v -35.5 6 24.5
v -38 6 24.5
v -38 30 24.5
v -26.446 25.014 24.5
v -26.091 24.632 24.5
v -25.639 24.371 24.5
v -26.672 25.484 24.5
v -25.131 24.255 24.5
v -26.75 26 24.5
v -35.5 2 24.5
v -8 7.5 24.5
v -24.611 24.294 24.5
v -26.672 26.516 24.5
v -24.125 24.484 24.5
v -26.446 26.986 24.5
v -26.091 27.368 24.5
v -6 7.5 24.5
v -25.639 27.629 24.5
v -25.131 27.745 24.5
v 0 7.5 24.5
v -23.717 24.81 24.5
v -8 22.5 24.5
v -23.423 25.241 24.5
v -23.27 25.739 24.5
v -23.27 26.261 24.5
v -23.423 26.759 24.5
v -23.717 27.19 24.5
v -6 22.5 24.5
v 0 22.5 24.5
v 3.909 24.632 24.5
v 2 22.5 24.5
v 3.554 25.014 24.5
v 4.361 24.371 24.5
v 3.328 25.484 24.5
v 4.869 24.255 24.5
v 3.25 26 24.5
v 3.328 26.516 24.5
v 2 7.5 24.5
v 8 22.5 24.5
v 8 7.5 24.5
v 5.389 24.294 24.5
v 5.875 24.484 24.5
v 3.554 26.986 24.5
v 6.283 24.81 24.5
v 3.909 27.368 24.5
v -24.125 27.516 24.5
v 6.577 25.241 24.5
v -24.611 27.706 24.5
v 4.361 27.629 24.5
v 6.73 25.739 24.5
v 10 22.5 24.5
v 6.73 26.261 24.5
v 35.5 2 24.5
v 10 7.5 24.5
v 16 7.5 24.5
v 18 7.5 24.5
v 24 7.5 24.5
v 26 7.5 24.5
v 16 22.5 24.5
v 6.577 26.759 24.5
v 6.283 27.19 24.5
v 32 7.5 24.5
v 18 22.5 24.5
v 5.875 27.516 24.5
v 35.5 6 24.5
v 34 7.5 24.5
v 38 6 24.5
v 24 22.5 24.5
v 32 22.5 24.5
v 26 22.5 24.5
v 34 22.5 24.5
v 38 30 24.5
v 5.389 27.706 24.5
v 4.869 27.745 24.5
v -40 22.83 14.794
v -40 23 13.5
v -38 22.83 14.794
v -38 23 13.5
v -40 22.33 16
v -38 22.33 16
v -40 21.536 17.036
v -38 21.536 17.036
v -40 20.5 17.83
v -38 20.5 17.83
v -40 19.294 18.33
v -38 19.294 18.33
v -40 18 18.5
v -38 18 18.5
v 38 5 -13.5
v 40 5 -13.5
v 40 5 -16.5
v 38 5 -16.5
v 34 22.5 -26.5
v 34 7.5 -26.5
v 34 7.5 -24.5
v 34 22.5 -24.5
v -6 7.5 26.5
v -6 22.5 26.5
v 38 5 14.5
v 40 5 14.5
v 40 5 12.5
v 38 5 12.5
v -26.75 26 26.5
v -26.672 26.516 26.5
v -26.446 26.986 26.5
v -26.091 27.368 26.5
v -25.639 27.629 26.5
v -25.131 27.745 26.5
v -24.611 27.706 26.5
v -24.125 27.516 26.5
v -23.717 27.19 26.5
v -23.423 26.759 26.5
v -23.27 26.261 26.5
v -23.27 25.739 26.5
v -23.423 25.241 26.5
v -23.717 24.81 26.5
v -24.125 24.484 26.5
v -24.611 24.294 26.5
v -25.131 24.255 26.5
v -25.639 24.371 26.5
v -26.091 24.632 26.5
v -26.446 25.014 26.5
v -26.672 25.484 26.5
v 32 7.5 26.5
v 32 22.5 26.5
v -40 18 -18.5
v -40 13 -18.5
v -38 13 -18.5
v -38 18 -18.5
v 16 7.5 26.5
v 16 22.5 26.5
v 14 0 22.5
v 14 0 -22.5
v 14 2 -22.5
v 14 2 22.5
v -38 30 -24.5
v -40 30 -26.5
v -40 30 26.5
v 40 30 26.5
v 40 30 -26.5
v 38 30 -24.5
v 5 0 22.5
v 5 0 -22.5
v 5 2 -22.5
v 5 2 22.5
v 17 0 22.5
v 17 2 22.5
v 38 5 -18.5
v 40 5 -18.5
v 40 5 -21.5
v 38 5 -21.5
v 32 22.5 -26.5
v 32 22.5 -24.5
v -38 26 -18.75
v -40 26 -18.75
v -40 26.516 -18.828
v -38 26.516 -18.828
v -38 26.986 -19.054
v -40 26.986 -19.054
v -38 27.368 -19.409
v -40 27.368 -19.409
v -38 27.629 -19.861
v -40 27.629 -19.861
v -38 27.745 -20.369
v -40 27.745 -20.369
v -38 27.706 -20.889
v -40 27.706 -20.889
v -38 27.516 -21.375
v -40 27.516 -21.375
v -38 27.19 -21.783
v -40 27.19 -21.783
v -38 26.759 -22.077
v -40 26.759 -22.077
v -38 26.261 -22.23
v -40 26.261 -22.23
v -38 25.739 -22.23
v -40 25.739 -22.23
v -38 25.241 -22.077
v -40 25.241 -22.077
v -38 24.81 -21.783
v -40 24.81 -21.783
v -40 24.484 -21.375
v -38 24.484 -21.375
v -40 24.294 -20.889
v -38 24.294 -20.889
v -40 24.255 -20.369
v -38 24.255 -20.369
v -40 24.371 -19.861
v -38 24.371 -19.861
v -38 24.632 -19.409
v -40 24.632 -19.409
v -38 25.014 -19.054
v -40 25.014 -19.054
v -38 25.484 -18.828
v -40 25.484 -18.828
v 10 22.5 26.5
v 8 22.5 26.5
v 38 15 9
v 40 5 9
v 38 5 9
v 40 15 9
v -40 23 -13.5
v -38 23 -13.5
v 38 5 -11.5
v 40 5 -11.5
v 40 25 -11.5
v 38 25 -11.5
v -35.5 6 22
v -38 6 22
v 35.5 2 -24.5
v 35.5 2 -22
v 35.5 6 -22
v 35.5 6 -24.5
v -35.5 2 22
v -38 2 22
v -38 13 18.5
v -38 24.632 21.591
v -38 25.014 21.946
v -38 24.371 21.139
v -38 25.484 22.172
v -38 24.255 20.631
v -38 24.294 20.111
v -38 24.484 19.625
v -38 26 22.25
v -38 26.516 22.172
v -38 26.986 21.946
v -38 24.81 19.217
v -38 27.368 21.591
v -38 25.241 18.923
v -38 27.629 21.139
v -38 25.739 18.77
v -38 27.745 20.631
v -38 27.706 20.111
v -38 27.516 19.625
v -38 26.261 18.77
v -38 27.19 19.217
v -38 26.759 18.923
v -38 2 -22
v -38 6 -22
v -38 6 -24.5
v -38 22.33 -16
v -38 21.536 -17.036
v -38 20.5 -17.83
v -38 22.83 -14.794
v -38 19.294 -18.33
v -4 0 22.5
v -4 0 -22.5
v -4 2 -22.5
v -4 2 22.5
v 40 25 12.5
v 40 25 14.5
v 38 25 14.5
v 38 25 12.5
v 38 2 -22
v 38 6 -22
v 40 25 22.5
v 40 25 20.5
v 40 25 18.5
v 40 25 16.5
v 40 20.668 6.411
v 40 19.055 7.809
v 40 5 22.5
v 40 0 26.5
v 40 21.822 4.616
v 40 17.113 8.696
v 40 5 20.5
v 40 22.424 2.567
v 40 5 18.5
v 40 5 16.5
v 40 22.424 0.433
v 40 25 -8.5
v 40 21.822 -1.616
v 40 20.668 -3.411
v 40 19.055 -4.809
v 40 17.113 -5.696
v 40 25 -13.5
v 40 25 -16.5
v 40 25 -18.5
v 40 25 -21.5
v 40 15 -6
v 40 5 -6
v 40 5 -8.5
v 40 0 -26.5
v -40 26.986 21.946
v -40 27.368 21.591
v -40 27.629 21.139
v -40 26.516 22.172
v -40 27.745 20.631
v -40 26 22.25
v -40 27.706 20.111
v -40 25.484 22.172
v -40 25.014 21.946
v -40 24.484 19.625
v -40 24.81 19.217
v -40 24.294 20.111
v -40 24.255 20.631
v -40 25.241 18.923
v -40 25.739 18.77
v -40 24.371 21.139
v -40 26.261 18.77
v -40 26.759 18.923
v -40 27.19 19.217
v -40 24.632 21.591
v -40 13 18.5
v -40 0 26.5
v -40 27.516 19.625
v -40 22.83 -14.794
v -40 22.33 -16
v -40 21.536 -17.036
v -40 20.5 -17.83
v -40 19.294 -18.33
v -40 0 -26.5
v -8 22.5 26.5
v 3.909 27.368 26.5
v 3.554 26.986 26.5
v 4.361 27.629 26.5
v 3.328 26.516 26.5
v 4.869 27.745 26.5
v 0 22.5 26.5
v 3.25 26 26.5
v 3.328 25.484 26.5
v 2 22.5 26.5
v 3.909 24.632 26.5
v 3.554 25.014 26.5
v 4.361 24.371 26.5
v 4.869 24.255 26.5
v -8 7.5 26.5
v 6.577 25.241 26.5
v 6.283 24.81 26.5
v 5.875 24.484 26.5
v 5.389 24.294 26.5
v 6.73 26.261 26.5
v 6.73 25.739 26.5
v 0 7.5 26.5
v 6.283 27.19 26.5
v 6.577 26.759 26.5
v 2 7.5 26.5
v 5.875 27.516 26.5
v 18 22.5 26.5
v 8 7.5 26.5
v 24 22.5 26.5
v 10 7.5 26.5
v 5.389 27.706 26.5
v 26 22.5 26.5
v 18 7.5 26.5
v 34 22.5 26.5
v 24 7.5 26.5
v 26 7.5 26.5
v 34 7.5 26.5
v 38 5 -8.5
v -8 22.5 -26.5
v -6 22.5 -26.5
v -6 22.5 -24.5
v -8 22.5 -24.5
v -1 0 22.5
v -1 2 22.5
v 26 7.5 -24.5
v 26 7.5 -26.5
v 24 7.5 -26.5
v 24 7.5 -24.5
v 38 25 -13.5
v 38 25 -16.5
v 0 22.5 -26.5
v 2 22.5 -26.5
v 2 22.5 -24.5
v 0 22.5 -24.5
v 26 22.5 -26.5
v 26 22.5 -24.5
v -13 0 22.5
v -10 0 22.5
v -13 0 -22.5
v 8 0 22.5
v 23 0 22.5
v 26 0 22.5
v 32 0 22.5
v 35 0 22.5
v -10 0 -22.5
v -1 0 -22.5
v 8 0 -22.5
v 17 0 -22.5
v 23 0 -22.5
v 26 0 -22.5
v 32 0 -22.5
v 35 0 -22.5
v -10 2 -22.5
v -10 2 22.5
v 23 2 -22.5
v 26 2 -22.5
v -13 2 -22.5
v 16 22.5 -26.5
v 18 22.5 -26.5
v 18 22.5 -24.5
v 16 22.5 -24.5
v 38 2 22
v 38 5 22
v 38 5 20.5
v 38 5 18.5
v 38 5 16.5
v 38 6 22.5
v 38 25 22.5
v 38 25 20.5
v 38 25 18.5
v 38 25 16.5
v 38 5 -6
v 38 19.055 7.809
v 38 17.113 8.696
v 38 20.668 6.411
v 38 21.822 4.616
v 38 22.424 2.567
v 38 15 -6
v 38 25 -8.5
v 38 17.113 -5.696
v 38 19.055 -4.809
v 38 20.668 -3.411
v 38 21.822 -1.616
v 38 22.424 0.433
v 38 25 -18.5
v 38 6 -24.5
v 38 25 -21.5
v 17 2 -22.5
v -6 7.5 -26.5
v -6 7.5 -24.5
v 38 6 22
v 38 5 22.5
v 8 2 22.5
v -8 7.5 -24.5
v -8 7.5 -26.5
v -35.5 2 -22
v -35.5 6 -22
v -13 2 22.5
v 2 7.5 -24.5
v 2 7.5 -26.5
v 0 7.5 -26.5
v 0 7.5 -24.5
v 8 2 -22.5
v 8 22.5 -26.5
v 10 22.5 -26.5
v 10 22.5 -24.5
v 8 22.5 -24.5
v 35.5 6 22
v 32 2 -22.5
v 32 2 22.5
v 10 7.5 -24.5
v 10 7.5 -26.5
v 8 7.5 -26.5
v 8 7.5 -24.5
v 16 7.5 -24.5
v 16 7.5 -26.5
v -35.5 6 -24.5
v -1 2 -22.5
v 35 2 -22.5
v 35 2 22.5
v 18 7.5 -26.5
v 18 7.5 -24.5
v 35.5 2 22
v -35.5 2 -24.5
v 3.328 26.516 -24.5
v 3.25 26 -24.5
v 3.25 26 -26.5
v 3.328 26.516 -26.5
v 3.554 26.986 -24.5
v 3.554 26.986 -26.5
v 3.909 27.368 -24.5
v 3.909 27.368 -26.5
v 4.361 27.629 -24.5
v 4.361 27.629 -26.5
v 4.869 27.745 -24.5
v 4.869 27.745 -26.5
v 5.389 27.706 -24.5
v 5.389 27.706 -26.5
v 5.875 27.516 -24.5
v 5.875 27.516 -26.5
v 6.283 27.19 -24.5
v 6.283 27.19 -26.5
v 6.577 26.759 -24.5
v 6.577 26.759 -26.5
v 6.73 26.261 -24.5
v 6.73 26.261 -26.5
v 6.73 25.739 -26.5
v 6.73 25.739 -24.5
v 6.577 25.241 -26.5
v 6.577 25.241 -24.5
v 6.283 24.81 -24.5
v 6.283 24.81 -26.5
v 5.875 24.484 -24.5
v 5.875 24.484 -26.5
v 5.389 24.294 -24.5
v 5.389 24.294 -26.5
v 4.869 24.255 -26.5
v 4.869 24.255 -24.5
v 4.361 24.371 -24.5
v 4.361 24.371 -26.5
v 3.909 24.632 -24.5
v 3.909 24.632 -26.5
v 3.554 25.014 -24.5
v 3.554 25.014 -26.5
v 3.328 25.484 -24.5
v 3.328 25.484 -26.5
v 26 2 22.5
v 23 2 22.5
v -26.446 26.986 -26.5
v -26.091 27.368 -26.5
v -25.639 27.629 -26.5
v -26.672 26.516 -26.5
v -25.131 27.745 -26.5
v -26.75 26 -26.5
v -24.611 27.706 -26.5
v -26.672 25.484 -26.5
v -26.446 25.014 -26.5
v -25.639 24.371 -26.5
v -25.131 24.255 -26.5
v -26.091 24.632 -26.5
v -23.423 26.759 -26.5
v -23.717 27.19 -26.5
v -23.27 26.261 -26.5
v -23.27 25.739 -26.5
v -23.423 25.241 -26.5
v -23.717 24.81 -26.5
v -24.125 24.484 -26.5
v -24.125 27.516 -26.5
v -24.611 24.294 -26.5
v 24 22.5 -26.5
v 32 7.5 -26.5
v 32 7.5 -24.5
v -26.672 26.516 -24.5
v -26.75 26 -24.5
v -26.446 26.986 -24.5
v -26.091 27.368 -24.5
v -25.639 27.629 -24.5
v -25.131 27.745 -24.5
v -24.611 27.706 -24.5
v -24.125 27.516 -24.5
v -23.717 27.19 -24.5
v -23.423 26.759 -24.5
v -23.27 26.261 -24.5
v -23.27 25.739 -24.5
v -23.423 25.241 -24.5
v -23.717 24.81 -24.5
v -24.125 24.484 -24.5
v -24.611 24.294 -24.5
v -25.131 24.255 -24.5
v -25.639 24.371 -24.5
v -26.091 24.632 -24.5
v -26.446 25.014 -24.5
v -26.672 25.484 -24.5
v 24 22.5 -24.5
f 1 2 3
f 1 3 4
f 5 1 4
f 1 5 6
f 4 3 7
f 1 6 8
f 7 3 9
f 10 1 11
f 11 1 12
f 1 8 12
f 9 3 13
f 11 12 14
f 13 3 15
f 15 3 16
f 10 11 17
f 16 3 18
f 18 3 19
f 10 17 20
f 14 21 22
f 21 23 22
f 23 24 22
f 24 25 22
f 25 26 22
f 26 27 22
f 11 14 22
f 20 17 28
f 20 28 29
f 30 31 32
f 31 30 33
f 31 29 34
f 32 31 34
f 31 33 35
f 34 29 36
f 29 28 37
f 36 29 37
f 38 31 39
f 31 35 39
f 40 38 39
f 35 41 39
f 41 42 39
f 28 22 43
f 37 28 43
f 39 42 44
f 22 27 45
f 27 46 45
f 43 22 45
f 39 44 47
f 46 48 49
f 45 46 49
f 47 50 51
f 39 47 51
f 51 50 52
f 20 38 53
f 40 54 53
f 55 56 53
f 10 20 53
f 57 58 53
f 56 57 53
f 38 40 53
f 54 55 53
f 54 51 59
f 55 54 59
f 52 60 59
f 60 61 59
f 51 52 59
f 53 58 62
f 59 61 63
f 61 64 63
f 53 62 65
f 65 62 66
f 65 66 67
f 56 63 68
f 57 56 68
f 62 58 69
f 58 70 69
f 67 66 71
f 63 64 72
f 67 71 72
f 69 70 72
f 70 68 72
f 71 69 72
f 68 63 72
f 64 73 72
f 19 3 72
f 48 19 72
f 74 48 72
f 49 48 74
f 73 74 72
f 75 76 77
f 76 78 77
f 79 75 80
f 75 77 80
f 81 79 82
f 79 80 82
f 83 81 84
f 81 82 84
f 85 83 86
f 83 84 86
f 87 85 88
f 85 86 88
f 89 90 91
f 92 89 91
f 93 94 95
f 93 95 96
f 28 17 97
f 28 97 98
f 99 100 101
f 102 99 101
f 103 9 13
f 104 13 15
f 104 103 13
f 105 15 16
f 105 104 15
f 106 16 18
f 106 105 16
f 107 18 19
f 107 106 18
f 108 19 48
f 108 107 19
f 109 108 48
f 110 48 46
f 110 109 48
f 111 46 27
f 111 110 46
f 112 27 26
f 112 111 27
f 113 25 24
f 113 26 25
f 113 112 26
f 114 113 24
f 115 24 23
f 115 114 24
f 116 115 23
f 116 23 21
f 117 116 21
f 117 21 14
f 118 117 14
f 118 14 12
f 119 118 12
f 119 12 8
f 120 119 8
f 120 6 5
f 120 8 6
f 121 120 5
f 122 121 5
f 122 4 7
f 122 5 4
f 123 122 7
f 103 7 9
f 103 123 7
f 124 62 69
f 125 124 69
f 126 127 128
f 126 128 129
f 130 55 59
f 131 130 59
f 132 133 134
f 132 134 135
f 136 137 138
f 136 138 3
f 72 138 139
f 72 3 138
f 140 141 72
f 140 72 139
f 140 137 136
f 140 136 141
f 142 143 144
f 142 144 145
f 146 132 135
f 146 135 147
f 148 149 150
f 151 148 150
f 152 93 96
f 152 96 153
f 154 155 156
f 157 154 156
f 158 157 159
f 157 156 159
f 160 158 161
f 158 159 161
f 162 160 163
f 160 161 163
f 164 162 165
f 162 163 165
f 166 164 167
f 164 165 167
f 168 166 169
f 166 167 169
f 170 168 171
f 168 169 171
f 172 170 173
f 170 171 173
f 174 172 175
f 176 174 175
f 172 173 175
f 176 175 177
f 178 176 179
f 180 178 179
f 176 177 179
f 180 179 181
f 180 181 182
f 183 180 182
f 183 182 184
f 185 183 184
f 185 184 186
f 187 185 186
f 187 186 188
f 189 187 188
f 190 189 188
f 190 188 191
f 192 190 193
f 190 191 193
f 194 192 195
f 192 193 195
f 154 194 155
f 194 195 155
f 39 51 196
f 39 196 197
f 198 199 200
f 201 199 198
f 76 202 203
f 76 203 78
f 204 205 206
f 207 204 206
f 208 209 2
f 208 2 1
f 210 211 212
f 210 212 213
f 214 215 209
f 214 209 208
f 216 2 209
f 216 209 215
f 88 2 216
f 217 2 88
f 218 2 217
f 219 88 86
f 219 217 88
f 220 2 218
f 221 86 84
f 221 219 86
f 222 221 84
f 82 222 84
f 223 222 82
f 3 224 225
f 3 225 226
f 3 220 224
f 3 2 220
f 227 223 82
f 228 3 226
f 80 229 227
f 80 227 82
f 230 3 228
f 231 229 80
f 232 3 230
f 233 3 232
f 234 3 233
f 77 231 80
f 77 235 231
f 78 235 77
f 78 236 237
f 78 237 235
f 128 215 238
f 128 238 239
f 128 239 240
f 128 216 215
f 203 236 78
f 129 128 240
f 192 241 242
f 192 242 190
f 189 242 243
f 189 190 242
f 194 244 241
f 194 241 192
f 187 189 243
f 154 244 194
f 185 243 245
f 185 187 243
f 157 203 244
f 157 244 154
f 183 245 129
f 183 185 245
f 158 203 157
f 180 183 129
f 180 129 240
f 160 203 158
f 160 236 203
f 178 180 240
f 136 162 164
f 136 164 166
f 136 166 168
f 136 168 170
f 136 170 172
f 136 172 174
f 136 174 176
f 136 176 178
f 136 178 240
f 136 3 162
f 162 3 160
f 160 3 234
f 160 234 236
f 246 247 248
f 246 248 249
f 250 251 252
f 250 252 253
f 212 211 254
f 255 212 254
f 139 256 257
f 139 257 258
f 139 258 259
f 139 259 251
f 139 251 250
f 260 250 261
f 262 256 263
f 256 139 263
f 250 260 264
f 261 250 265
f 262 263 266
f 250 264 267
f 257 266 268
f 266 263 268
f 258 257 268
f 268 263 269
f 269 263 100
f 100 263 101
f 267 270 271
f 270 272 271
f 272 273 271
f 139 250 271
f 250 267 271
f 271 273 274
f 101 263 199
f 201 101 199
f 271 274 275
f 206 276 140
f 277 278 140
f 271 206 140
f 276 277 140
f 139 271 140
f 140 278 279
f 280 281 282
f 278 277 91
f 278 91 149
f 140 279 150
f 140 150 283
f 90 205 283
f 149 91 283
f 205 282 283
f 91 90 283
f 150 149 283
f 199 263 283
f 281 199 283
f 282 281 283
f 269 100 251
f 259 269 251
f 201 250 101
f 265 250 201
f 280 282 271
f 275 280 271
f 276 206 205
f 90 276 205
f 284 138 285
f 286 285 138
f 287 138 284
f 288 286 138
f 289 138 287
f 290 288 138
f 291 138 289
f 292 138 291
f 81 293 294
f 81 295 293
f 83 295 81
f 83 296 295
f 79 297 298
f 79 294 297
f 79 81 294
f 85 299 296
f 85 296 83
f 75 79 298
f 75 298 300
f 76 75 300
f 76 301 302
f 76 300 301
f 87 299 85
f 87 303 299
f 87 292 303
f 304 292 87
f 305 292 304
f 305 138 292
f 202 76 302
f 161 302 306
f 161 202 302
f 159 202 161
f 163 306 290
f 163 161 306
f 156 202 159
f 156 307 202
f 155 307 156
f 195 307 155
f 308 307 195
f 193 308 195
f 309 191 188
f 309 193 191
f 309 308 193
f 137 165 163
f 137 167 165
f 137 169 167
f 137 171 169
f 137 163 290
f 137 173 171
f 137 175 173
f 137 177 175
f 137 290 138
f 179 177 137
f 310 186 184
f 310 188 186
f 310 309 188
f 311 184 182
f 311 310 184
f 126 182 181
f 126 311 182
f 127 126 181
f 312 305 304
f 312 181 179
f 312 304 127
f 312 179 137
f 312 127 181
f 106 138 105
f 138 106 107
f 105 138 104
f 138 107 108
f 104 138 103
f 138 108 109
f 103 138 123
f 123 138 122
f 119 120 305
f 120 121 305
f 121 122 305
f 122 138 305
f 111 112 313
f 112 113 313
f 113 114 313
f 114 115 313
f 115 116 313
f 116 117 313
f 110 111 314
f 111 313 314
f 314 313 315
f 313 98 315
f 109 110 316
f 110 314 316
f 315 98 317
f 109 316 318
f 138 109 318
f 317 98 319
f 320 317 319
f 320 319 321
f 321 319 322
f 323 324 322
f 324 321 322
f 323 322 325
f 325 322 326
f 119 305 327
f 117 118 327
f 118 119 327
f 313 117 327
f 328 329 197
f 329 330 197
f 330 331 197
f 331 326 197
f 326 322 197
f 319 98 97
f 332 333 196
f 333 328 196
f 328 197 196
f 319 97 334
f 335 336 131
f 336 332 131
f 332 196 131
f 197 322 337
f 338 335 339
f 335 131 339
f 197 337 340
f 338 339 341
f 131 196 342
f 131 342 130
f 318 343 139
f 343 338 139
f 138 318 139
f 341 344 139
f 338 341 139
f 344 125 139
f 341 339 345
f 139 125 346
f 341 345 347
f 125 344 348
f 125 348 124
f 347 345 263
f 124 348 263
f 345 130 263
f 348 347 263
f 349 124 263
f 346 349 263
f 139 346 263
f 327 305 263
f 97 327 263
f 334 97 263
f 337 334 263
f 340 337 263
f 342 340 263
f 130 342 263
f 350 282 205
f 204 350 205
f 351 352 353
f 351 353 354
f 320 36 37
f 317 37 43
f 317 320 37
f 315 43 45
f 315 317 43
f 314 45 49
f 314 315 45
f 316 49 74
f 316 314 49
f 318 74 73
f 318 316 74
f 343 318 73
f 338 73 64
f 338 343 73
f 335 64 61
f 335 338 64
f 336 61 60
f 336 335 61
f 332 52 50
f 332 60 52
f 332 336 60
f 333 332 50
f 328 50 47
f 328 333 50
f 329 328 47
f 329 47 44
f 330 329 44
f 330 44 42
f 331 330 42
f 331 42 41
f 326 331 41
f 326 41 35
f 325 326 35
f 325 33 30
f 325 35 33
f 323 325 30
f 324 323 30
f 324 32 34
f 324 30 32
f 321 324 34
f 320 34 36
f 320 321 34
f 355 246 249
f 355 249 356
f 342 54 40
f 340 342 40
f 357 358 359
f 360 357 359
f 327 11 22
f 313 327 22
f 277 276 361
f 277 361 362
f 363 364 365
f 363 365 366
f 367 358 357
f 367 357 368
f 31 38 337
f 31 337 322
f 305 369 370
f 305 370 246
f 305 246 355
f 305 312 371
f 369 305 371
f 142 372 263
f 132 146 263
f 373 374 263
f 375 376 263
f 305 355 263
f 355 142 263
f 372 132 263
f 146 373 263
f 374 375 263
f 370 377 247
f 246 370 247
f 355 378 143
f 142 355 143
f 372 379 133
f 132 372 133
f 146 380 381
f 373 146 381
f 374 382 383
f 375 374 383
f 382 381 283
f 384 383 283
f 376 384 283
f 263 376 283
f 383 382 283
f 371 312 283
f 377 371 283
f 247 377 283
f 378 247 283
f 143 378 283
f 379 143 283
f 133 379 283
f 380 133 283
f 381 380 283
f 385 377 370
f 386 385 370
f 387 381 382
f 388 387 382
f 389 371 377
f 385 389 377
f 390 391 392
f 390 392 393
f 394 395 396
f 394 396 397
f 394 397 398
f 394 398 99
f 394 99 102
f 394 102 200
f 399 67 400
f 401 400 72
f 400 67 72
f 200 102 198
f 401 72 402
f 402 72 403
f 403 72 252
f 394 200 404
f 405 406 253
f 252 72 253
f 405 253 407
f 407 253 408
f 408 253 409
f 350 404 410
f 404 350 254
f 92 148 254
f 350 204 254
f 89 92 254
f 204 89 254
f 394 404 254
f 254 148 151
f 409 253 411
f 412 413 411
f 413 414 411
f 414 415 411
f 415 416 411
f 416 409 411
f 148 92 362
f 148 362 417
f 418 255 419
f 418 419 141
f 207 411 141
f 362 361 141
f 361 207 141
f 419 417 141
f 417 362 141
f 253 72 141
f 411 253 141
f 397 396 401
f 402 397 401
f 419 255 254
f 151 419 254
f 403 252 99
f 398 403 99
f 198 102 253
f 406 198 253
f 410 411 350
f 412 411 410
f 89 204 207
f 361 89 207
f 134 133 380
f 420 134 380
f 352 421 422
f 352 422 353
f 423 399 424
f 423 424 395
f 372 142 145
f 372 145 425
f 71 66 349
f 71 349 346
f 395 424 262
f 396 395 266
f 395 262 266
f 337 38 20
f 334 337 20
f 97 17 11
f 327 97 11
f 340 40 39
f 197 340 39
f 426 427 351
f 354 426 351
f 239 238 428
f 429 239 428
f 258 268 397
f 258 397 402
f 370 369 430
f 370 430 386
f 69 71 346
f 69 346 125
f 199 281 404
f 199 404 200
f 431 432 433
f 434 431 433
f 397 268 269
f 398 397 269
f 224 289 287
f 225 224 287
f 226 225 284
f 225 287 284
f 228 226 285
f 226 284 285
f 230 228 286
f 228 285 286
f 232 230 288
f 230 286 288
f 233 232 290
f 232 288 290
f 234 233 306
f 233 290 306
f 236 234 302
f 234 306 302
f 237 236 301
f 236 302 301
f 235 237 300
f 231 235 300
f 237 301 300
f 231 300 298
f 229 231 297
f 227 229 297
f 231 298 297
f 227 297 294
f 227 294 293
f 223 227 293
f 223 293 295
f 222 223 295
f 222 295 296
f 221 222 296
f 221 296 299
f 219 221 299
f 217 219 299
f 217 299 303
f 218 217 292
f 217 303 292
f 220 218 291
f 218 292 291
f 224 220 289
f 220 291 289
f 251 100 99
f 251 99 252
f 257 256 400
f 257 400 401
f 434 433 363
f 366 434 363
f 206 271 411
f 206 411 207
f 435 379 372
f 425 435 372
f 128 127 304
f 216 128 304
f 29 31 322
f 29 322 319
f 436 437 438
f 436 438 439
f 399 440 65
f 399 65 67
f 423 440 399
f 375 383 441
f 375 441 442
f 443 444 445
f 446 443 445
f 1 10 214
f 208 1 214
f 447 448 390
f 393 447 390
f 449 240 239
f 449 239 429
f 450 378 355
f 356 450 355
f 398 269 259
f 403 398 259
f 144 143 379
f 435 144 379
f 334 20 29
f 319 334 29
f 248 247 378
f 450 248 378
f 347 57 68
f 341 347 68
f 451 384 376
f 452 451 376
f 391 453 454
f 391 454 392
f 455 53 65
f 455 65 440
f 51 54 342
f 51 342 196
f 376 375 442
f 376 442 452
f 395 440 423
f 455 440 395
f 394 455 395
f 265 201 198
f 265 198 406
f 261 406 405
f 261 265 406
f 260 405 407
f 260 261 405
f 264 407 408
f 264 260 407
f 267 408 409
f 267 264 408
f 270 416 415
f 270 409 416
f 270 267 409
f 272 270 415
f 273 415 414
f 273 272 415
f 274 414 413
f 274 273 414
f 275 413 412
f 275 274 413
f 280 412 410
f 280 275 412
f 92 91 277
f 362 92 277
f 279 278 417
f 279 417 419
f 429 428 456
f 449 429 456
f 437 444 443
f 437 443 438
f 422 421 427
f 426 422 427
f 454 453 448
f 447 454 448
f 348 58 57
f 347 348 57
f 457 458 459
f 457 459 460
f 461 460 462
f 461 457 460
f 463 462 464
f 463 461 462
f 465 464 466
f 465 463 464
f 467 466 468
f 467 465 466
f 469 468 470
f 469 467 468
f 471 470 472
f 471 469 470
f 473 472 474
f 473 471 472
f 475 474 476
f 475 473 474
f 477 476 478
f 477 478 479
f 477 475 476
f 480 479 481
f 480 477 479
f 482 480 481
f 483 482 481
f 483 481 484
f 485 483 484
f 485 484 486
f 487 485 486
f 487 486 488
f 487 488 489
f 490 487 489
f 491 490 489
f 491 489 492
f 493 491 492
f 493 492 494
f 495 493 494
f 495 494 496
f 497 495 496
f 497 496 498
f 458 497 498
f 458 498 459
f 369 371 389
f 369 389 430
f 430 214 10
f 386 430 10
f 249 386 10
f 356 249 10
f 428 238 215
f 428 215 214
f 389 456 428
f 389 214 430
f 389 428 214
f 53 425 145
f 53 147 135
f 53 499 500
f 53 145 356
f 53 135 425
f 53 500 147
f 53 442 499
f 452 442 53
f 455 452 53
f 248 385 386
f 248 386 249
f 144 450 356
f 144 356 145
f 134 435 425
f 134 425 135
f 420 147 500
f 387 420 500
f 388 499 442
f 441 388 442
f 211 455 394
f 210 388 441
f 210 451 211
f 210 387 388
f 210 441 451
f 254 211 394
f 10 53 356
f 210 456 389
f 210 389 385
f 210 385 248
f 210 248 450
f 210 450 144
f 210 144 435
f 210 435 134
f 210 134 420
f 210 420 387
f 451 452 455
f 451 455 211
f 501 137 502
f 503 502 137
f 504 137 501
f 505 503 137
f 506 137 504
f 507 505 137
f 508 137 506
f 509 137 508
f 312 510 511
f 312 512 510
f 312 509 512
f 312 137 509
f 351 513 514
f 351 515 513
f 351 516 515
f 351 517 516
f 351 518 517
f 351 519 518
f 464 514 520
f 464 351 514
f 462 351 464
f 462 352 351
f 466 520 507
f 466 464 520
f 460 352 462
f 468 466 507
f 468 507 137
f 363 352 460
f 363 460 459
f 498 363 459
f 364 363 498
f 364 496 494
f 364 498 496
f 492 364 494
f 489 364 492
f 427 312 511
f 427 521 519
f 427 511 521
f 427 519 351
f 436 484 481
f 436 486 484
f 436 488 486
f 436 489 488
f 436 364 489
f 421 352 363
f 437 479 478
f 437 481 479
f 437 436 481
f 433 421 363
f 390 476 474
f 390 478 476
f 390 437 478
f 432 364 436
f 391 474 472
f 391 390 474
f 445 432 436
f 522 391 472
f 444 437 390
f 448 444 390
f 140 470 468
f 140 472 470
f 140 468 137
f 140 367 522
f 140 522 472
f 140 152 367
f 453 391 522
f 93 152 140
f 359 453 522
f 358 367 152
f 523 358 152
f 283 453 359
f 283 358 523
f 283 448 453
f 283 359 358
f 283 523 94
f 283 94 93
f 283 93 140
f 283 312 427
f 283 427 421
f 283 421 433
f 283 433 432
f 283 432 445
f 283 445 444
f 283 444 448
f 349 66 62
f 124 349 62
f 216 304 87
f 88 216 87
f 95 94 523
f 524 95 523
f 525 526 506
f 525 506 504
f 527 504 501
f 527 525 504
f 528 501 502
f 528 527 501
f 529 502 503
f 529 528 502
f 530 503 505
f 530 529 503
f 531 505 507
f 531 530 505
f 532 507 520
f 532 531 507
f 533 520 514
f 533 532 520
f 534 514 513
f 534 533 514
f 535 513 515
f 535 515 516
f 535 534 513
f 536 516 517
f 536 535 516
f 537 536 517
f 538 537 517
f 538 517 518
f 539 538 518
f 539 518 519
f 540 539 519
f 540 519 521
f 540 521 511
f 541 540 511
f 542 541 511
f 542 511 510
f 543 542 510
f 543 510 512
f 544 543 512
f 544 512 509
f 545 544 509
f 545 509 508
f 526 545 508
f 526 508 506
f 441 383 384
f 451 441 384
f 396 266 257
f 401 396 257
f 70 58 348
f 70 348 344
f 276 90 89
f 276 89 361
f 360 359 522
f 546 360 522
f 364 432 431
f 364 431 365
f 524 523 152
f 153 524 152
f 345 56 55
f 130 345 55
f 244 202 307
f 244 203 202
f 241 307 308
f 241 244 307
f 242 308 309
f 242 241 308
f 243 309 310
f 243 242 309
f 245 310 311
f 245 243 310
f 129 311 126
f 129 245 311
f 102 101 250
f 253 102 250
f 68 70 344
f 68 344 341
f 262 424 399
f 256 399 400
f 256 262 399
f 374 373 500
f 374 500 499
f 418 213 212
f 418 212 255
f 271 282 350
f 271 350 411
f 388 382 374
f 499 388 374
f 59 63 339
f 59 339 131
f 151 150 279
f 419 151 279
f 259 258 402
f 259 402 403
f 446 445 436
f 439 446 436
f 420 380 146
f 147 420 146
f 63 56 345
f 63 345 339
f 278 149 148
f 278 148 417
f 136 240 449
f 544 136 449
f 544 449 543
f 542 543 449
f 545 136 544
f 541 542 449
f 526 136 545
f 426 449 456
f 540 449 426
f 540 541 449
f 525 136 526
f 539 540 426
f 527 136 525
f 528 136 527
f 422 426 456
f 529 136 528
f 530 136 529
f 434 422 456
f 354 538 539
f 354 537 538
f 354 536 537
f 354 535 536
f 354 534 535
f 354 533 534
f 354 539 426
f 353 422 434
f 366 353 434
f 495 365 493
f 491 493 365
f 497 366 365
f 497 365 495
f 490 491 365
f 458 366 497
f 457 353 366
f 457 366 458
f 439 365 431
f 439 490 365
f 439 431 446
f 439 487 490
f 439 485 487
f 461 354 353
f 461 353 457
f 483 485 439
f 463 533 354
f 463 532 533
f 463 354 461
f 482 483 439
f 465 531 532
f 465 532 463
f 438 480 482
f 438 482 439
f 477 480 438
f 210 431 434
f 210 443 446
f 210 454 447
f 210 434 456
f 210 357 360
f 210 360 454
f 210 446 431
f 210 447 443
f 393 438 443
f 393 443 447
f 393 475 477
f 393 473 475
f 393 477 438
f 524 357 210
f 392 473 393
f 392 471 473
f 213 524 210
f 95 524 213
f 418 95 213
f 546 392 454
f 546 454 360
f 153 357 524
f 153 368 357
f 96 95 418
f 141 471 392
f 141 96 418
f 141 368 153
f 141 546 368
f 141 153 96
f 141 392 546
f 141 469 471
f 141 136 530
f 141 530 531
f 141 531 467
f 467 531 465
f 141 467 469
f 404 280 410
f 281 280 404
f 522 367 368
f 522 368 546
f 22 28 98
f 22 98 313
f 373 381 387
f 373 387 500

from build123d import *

# Parameters (mm, degrees)
SKETCH1_W           = 80
SKETCH1_H           = 53
BOSS_EXTRUDE1_DEPTH = 30
SKETCH2_W           = 76
SKETCH2_H           = 49
CUT_EXTRUDE1_DEPTH  = 28
CUT_EXTRUDE2_DEPTH  = 6
SKETCH4_W           = 37
SKETCH4_H           = 10
CUT_EXTRUDE3_DEPTH  = 6
SKETCH5_W           = 2.5
SKETCH5_H           = 2.5
STANDOFFS_DEPTH     = 4
FILLET3_R           = 5
FILLET4_R           = 5
SKETCH6_W           = 3
SKETCH6_H           = 45
BOTTOM_GRILL_DEPTH  = 2
CUT_EXTRUDE5_REACH  = 74.863
SKETCH7_W           = 2
SKETCH7_H           = 15
CUT_EXTRUDE6_START  = -53
SKETCH8_R           = 1.75
CUT_EXTRUDE6_DEPTH  = 53
SKETCH9_R           = 1.75
CUT_EXTRUDE7_DEPTH  = 2
SKETCH10_W          = 3
SKETCH10_H          = 20
SKETCH10_W_2        = 2
CUT_EXTRUDE8_DEPTH  = 2


with BuildPart() as part:
    # Sketch1 → Boss-Extrude1 (new body)
    with BuildSketch(Plane(origin=(0, 0, 0), x_dir=(1, 0, 0), z_dir=(0, 1, 0))):
        Rectangle(SKETCH1_W, SKETCH1_H)
    extrude(amount=BOSS_EXTRUDE1_DEPTH)

    # Sketch2 → Cut-Extrude1 (cut)
    with BuildSketch(Plane(origin=(0, 30, 0), x_dir=(1, 0, 0), z_dir=(0, 1, 0))):
        Rectangle(SKETCH2_W, SKETCH2_H)
    extrude(amount=-CUT_EXTRUDE1_DEPTH, mode=Mode.SUBTRACT)

    # Sketch3 → Cut-Extrude2 (cut)
    with BuildSketch(Plane(origin=(40, 0, 0), x_dir=(0, 0, -1), z_dir=(1, 0, 0))):
        with BuildLine():
            Line((6, 15), (6, 5))
            Line((6, 5), (-9, 5))
            Line((-9, 5), (-9, 15))
            ThreePointArc((-9, 15), (-1.5, 22.5), (6, 15))
        make_face()
    extrude(amount=-CUT_EXTRUDE2_DEPTH, mode=Mode.SUBTRACT)

    # Sketch4 → Cut-Extrude3 (cut)
    with BuildSketch(Plane.ZY.offset(40)):
        with Locations((0, 18)):
            Rectangle(SKETCH4_W, SKETCH4_H)
    extrude(amount=-CUT_EXTRUDE3_DEPTH, mode=Mode.SUBTRACT)

    # Sketch5 → Standoffs (add)
    with BuildSketch(Plane(origin=(0, 2, 0), x_dir=(1, 0, 0), z_dir=(0, 1, 0))):
        with Locations((36.75, 23.25)):
            Rectangle(SKETCH5_W, SKETCH5_H)
        with Locations((36.75, -23.25)):
            Rectangle(SKETCH5_W, SKETCH5_H)
        with Locations((-36.75, -23.25)):
            Rectangle(SKETCH5_W, SKETCH5_H)
        with Locations((-36.75, 23.25)):
            Rectangle(SKETCH5_W, SKETCH5_H)
    extrude(amount=STANDOFFS_DEPTH)

    # Fillet3
    fillet3_edges = [part.edges().sort_by_distance(p)[0] for p in [
        (-39, 23, -18.5),
    ]]
    fillet(fillet3_edges, radius=FILLET3_R)

    # Fillet4
    fillet4_edges = [part.edges().sort_by_distance(p)[0] for p in [
        (-39, 23, 18.5),
    ]]
    fillet(fillet4_edges, radius=FILLET4_R)

    # Sketch6 → Bottom Grill (cut)
    with BuildSketch(Plane.XZ):
        with Locations((33.5, 0)):
            Rectangle(SKETCH6_W, SKETCH6_H)
        with Locations((24.5, 0)):
            Rectangle(SKETCH6_W, SKETCH6_H)
        with Locations((15.5, 0)):
            Rectangle(SKETCH6_W, SKETCH6_H)
        with Locations((6.5, 0)):
            Rectangle(SKETCH6_W, SKETCH6_H)
        with Locations((-2.5, 0)):
            Rectangle(SKETCH6_W, SKETCH6_H)
        with Locations((-11.5, 0)):
            Rectangle(SKETCH6_W, SKETCH6_H)
    extrude(amount=-BOTTOM_GRILL_DEPTH, mode=Mode.SUBTRACT)

    # Cut-Extrude5: up to this face of the body (flat: up to its plane)
    cut_extrude5_end = Plane(part.part.faces().sort_by_distance((0, 15, 26.5))[0])
    # Sketch7 → Cut-Extrude5 (cut, up to the picked face)
    with BuildSketch(Plane(origin=(0, 0, -26.5), x_dir=(-1, 0, 0), z_dir=(0, 0, -1)), mode=Mode.PRIVATE) as cut_extrude5_sk1:
        with Locations((-33, 15)):
            Rectangle(SKETCH7_W, SKETCH7_H)
    cut_extrude5_tool1 = split(extrude(cut_extrude5_sk1.sketch, amount=-CUT_EXTRUDE5_REACH, mode=Mode.PRIVATE), bisect_by=cut_extrude5_end, keep=Keep.BOTH, mode=Mode.PRIVATE)
    # Sketch7 → Cut-Extrude5 (cut, up to the picked face)
    with BuildSketch(Plane(origin=(0, 0, -26.5), x_dir=(-1, 0, 0), z_dir=(0, 0, -1)), mode=Mode.PRIVATE) as cut_extrude5_sk2:
        with Locations((-25, 15)):
            Rectangle(SKETCH7_W, SKETCH7_H)
    cut_extrude5_tool2 = split(extrude(cut_extrude5_sk2.sketch, amount=-CUT_EXTRUDE5_REACH, mode=Mode.PRIVATE), bisect_by=cut_extrude5_end, keep=Keep.BOTH, mode=Mode.PRIVATE)
    # Sketch7 → Cut-Extrude5 (cut, up to the picked face)
    with BuildSketch(Plane(origin=(0, 0, -26.5), x_dir=(-1, 0, 0), z_dir=(0, 0, -1)), mode=Mode.PRIVATE) as cut_extrude5_sk3:
        with Locations((-17, 15)):
            Rectangle(SKETCH7_W, SKETCH7_H)
    cut_extrude5_tool3 = split(extrude(cut_extrude5_sk3.sketch, amount=-CUT_EXTRUDE5_REACH, mode=Mode.PRIVATE), bisect_by=cut_extrude5_end, keep=Keep.BOTH, mode=Mode.PRIVATE)
    # Sketch7 → Cut-Extrude5 (cut, up to the picked face)
    with BuildSketch(Plane(origin=(0, 0, -26.5), x_dir=(-1, 0, 0), z_dir=(0, 0, -1)), mode=Mode.PRIVATE) as cut_extrude5_sk4:
        with Locations((-9, 15)):
            Rectangle(SKETCH7_W, SKETCH7_H)
    cut_extrude5_tool4 = split(extrude(cut_extrude5_sk4.sketch, amount=-CUT_EXTRUDE5_REACH, mode=Mode.PRIVATE), bisect_by=cut_extrude5_end, keep=Keep.BOTH, mode=Mode.PRIVATE)
    # Sketch7 → Cut-Extrude5 (cut, up to the picked face)
    with BuildSketch(Plane(origin=(0, 0, -26.5), x_dir=(-1, 0, 0), z_dir=(0, 0, -1)), mode=Mode.PRIVATE) as cut_extrude5_sk5:
        with Locations((-1, 15)):
            Rectangle(SKETCH7_W, SKETCH7_H)
    cut_extrude5_tool5 = split(extrude(cut_extrude5_sk5.sketch, amount=-CUT_EXTRUDE5_REACH, mode=Mode.PRIVATE), bisect_by=cut_extrude5_end, keep=Keep.BOTH, mode=Mode.PRIVATE)
    # Sketch7 → Cut-Extrude5 (cut, up to the picked face)
    with BuildSketch(Plane(origin=(0, 0, -26.5), x_dir=(-1, 0, 0), z_dir=(0, 0, -1)), mode=Mode.PRIVATE) as cut_extrude5_sk6:
        with Locations((7, 15)):
            Rectangle(SKETCH7_W, SKETCH7_H)
    cut_extrude5_tool6 = split(extrude(cut_extrude5_sk6.sketch, amount=-CUT_EXTRUDE5_REACH, mode=Mode.PRIVATE), bisect_by=cut_extrude5_end, keep=Keep.BOTH, mode=Mode.PRIVATE)
    add(cut_extrude5_tool1.solids().sort_by(Axis((33, 15, -26.5), (0, 0, 1)))[0], mode=Mode.SUBTRACT)
    add(cut_extrude5_tool2.solids().sort_by(Axis((25, 15, -26.5), (0, 0, 1)))[0], mode=Mode.SUBTRACT)
    add(cut_extrude5_tool3.solids().sort_by(Axis((17, 15, -26.5), (0, 0, 1)))[0], mode=Mode.SUBTRACT)
    add(cut_extrude5_tool4.solids().sort_by(Axis((9, 15, -26.5), (0, 0, 1)))[0], mode=Mode.SUBTRACT)
    add(cut_extrude5_tool5.solids().sort_by(Axis((1, 15, -26.5), (0, 0, 1)))[0], mode=Mode.SUBTRACT)
    add(cut_extrude5_tool6.solids().sort_by(Axis((-7, 15, -26.5), (0, 0, 1)))[0], mode=Mode.SUBTRACT)

    # Sketch8 → Cut-Extrude6 (cut)
    with BuildSketch(Plane(origin=(0, 0, -26.5), x_dir=(-1, 0, 0), z_dir=(0, 0, -1)).offset(CUT_EXTRUDE6_START)):
        with Locations((-5, 26)):
            Circle(SKETCH8_R)
        with Locations((25, 26)):
            Circle(SKETCH8_R)
    extrude(amount=CUT_EXTRUDE6_DEPTH, mode=Mode.SUBTRACT)

    # Sketch9 → Cut-Extrude7 (cut)
    with BuildSketch(Plane.ZY.offset(40)):
        with Locations((-20.5, 26)):
            Circle(SKETCH9_R)
        with Locations((20.5, 26)):
            Circle(SKETCH9_R)
    extrude(amount=-CUT_EXTRUDE7_DEPTH, mode=Mode.SUBTRACT)

    # Sketch10 → Cut-Extrude8 (cut)
    with BuildSketch(Plane(origin=(40, 0, 0), x_dir=(0, 0, -1), z_dir=(1, 0, 0))):
        with Locations((20, 15)):
            Rectangle(SKETCH10_W, SKETCH10_H)
        with Locations((15, 15)):
            Rectangle(SKETCH10_W, SKETCH10_H)
        with Locations((10, 15)):
            Rectangle(SKETCH10_W, SKETCH10_H)
        with Locations((-21.5, 15)):
            Rectangle(SKETCH10_W_2, SKETCH10_H)
        with Locations((-17.5, 15)):
            Rectangle(SKETCH10_W_2, SKETCH10_H)
        with Locations((-13.5, 15)):
            Rectangle(SKETCH10_W_2, SKETCH10_H)
    extrude(amount=-CUT_EXTRUDE8_DEPTH, mode=Mode.SUBTRACT)


solid = part.part
